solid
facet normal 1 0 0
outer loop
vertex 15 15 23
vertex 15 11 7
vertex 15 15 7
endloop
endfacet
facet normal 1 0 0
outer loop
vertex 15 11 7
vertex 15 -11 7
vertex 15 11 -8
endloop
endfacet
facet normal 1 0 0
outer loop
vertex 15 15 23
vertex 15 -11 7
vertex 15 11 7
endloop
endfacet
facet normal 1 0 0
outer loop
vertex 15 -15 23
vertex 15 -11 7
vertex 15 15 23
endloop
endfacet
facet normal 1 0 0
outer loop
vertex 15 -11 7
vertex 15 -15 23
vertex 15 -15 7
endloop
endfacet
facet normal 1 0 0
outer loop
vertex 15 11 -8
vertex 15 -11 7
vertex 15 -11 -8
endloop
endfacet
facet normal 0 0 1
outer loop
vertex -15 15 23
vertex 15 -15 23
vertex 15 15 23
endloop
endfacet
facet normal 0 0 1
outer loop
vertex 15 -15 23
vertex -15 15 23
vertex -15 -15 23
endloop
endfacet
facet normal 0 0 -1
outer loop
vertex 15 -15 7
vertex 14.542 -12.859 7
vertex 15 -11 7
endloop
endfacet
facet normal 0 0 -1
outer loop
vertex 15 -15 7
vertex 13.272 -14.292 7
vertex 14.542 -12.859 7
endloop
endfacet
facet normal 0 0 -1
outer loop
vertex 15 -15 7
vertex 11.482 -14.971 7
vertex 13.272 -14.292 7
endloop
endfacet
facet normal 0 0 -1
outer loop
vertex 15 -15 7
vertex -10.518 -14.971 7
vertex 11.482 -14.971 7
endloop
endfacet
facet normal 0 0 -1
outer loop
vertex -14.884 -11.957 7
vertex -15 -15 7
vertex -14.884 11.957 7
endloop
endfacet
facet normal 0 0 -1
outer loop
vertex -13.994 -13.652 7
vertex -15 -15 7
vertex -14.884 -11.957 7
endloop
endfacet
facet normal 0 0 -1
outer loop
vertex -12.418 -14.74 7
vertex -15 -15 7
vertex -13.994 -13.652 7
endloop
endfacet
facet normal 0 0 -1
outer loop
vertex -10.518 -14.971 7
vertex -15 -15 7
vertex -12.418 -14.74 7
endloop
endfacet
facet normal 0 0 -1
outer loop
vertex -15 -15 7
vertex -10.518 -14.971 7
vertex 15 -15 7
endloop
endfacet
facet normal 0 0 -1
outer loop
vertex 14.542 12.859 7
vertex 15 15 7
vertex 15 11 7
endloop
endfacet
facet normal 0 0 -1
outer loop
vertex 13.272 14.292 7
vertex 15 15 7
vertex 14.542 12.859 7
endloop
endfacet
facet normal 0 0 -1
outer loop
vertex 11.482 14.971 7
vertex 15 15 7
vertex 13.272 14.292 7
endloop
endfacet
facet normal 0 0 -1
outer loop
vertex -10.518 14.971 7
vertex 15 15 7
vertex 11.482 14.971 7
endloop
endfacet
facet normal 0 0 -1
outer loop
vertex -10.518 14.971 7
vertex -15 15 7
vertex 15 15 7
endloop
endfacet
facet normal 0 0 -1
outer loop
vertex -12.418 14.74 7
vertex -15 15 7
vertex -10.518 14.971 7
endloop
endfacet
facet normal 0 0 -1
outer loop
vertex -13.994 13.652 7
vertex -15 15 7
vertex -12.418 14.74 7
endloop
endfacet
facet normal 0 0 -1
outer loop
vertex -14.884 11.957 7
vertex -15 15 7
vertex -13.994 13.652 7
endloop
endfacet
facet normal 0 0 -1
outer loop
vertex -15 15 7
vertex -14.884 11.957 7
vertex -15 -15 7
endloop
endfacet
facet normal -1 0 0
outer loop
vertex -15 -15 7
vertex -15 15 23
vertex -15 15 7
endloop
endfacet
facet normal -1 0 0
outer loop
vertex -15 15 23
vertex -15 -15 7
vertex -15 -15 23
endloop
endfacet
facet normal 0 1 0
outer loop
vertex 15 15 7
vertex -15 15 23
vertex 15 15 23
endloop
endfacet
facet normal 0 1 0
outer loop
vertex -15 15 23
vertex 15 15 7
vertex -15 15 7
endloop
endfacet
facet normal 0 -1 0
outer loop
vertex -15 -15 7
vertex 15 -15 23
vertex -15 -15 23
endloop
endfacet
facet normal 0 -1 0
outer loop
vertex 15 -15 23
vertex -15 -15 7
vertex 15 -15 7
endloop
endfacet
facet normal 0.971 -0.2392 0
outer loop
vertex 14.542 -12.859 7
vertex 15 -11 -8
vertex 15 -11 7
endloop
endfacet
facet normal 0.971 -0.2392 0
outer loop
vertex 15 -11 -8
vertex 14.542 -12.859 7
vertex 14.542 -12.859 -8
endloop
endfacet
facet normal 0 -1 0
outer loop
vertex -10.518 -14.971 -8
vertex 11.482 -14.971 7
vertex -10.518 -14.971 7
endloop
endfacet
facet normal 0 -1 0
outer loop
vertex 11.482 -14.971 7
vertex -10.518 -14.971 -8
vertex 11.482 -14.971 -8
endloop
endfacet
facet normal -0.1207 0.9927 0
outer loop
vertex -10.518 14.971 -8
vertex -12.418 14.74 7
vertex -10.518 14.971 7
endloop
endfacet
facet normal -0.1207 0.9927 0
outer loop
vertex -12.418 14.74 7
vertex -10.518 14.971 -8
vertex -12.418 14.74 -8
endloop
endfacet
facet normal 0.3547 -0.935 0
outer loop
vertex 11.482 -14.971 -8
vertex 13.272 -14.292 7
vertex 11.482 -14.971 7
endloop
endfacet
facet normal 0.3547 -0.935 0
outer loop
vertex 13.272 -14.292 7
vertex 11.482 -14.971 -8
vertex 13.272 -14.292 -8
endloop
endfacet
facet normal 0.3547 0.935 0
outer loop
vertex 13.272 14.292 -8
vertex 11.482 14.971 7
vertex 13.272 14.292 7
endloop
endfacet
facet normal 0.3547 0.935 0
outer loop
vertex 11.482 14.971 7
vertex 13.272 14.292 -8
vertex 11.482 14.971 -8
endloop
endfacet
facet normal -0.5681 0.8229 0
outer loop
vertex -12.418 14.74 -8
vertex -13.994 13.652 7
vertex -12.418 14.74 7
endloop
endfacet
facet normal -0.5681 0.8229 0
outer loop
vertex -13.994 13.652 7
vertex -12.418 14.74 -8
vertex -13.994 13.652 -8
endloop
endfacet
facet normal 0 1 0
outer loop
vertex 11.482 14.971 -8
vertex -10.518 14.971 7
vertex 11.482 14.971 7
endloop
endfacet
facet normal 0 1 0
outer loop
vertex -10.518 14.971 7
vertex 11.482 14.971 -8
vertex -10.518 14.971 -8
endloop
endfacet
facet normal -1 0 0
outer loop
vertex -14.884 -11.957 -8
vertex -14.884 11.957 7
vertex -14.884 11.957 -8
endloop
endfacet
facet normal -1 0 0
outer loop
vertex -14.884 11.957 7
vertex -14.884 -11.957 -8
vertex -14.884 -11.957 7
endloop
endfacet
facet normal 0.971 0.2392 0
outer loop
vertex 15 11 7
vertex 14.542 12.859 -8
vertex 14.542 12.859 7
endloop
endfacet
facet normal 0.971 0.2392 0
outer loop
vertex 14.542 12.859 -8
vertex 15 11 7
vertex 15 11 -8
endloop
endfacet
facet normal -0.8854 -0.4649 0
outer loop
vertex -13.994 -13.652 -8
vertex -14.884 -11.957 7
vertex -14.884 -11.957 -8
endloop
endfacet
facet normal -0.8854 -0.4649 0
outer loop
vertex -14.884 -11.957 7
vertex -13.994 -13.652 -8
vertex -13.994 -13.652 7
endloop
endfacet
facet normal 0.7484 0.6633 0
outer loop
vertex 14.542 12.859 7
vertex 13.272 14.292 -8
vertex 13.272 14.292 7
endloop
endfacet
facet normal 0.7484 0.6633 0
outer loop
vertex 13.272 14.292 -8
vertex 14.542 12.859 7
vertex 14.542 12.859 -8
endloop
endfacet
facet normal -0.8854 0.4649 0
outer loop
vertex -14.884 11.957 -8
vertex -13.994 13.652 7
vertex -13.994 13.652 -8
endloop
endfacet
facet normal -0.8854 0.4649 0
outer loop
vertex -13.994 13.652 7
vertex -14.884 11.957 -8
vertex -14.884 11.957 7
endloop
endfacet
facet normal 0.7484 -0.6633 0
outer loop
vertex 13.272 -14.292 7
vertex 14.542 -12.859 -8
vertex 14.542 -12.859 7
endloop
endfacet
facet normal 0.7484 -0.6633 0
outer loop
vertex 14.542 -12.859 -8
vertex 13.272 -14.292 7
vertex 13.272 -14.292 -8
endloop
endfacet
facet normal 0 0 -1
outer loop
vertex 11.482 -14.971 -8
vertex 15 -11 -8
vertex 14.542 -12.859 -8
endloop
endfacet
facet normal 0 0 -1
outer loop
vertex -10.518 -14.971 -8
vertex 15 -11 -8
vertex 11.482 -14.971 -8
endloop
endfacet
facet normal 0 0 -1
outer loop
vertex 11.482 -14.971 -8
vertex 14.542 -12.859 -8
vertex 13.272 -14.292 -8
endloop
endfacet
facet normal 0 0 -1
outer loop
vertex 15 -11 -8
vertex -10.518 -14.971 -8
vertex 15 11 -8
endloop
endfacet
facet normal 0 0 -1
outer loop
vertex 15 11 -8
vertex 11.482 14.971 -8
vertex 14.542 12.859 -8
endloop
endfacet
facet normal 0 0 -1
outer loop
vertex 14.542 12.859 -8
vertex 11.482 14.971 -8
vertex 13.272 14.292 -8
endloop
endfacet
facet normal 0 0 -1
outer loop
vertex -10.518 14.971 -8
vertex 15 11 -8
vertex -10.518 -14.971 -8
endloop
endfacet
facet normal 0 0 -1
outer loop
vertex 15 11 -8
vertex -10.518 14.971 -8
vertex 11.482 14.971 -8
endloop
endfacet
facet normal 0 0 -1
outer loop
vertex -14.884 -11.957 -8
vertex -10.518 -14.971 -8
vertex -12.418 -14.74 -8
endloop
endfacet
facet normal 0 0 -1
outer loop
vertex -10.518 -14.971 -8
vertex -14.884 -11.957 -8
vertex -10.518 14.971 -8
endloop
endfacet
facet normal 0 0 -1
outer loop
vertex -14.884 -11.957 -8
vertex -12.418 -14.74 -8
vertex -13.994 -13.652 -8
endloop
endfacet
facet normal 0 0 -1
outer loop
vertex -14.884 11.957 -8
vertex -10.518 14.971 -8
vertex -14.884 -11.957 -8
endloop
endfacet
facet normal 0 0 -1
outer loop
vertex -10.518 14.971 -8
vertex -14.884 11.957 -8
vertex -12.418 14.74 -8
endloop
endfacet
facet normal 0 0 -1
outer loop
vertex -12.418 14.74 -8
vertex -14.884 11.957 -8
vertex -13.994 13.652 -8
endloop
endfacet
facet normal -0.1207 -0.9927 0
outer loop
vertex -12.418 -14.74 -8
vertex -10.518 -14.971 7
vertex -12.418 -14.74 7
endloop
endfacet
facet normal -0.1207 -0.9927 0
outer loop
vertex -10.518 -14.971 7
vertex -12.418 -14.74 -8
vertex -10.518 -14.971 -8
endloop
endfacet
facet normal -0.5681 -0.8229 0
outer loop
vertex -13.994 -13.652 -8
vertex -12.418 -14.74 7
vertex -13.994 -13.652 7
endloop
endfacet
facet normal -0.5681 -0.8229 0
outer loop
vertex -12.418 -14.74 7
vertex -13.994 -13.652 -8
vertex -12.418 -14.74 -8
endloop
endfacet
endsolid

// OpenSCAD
len_phone = 145;
width_phone = 56;
thickness_phone = 8;
corner_round = 8;

d_screw_m4 = 4.5;
thickness_holder = 4;
append = 15;

// holder_set();
// horizontal_block(20);
// vertical_block(len_phone);

color("red")
translate([0, 0, 30/2])
cube([30, 30, 2*thickness_phone], center=true);
grip();

module grip() {
    hull() {
        translate([30/2-corner_round/2, -30/2+corner_round/2, 0])
        cylinder(d=corner_round, 2*thickness_phone, center=true);
        translate([-30/2+corner_round/2, -30/2+corner_round/2, 0])
        cylinder(d=corner_round, 2*thickness_phone, center=true);
        translate([30/2-corner_round/2, 30/2-corner_round/2, 0])
        cylinder(d=corner_round, 2*thickness_phone, center=true);
        translate([-30/2+corner_round/2, 30/2-corner_round/2, 0])
        cylinder(d=corner_round, 2*thickness_phone, center=true);
    }
}


module holder_set() {
    horizontal_block(len_block=width_phone,
    offset_vertical=10);
    vertical_block(len_block=len_phone);
}

module vertical_block(len_block) {
    len_block = len_block + append;
    difference() {

        hull() {
            //translate([0, -len_phone/2, 0])
            translate([0, -len_block/2, 0])
            cylinder(d=9, h=thickness_holder, center=
            true, $fn=32);

            //translate([0, len_phone/2, 0])
            translate([0, len_block/2, 0])
            cylinder(d=9, h=thickness_holder, center=
            true, $fn=32);
        }
        color("red")
        hull() {
            // translate([0, -len_phone/2, 0])
            translate([0, -len_block/2, 0])
            cylinder(d=d_screw_m4, h=thickness_holder+2
            , center=true, $fn=32);

            // translate([0, len_phone/2, 0])
            translate([0, len_block/2, 0])
            cylinder(d=d_screw_m4, h=thickness_holder+2
            , center=true, $fn=32);
        }
    }
}

module t_cross() {
    hull() {
        translate([0, -len_phone/2, 0])
        cylinder(d=9, h=thickness_holder, center=true, $fn=32);

        translate([0, len_phone/2, 0])
        cylinder(d=9, h=thickness_holder, center=true, $fn=32);
    }

    hull() {
        translate([width_phone/2, 0, 0])
        cylinder(d=9, h=thickness_holder, center=true, $fn=32);

        translate([-width_phone/2, 0, 0])
        cylinder(d=9, h=thickness_holder, center=true, $fn=32);
    }
    
    cylinder(h=thickness_holder, d=25, center=true, $fn=64);
}



module screw_hole() {
    difference() {
        union() {
            color("red")
            hull() {
                translate([0, -len_phone/2, 0])
                cylinder(d=d_screw_m4, h=thickness_holder+2, center=true, $fn=32);

                translate([0, len_phone/2, 0])
                cylinder(d=d_screw_m4, h=thickness_holder+2, center=true, $fn=32);
            }

            color("red")
            hull() {
                translate([width_phone/2, 0, 0])
                cylinder(d=d_screw_m4, h=thickness_holder+2, center=true, $fn=32);

                translate([-width_phone/2, 0, 0])
                cylinder(d=d_screw_m4, h=thickness_holder+2, center=true, $fn=32);
            }
        }
        
        cylinder(h=thickness_holder+4, d=25, center=true, $fn=64);
    }
}
